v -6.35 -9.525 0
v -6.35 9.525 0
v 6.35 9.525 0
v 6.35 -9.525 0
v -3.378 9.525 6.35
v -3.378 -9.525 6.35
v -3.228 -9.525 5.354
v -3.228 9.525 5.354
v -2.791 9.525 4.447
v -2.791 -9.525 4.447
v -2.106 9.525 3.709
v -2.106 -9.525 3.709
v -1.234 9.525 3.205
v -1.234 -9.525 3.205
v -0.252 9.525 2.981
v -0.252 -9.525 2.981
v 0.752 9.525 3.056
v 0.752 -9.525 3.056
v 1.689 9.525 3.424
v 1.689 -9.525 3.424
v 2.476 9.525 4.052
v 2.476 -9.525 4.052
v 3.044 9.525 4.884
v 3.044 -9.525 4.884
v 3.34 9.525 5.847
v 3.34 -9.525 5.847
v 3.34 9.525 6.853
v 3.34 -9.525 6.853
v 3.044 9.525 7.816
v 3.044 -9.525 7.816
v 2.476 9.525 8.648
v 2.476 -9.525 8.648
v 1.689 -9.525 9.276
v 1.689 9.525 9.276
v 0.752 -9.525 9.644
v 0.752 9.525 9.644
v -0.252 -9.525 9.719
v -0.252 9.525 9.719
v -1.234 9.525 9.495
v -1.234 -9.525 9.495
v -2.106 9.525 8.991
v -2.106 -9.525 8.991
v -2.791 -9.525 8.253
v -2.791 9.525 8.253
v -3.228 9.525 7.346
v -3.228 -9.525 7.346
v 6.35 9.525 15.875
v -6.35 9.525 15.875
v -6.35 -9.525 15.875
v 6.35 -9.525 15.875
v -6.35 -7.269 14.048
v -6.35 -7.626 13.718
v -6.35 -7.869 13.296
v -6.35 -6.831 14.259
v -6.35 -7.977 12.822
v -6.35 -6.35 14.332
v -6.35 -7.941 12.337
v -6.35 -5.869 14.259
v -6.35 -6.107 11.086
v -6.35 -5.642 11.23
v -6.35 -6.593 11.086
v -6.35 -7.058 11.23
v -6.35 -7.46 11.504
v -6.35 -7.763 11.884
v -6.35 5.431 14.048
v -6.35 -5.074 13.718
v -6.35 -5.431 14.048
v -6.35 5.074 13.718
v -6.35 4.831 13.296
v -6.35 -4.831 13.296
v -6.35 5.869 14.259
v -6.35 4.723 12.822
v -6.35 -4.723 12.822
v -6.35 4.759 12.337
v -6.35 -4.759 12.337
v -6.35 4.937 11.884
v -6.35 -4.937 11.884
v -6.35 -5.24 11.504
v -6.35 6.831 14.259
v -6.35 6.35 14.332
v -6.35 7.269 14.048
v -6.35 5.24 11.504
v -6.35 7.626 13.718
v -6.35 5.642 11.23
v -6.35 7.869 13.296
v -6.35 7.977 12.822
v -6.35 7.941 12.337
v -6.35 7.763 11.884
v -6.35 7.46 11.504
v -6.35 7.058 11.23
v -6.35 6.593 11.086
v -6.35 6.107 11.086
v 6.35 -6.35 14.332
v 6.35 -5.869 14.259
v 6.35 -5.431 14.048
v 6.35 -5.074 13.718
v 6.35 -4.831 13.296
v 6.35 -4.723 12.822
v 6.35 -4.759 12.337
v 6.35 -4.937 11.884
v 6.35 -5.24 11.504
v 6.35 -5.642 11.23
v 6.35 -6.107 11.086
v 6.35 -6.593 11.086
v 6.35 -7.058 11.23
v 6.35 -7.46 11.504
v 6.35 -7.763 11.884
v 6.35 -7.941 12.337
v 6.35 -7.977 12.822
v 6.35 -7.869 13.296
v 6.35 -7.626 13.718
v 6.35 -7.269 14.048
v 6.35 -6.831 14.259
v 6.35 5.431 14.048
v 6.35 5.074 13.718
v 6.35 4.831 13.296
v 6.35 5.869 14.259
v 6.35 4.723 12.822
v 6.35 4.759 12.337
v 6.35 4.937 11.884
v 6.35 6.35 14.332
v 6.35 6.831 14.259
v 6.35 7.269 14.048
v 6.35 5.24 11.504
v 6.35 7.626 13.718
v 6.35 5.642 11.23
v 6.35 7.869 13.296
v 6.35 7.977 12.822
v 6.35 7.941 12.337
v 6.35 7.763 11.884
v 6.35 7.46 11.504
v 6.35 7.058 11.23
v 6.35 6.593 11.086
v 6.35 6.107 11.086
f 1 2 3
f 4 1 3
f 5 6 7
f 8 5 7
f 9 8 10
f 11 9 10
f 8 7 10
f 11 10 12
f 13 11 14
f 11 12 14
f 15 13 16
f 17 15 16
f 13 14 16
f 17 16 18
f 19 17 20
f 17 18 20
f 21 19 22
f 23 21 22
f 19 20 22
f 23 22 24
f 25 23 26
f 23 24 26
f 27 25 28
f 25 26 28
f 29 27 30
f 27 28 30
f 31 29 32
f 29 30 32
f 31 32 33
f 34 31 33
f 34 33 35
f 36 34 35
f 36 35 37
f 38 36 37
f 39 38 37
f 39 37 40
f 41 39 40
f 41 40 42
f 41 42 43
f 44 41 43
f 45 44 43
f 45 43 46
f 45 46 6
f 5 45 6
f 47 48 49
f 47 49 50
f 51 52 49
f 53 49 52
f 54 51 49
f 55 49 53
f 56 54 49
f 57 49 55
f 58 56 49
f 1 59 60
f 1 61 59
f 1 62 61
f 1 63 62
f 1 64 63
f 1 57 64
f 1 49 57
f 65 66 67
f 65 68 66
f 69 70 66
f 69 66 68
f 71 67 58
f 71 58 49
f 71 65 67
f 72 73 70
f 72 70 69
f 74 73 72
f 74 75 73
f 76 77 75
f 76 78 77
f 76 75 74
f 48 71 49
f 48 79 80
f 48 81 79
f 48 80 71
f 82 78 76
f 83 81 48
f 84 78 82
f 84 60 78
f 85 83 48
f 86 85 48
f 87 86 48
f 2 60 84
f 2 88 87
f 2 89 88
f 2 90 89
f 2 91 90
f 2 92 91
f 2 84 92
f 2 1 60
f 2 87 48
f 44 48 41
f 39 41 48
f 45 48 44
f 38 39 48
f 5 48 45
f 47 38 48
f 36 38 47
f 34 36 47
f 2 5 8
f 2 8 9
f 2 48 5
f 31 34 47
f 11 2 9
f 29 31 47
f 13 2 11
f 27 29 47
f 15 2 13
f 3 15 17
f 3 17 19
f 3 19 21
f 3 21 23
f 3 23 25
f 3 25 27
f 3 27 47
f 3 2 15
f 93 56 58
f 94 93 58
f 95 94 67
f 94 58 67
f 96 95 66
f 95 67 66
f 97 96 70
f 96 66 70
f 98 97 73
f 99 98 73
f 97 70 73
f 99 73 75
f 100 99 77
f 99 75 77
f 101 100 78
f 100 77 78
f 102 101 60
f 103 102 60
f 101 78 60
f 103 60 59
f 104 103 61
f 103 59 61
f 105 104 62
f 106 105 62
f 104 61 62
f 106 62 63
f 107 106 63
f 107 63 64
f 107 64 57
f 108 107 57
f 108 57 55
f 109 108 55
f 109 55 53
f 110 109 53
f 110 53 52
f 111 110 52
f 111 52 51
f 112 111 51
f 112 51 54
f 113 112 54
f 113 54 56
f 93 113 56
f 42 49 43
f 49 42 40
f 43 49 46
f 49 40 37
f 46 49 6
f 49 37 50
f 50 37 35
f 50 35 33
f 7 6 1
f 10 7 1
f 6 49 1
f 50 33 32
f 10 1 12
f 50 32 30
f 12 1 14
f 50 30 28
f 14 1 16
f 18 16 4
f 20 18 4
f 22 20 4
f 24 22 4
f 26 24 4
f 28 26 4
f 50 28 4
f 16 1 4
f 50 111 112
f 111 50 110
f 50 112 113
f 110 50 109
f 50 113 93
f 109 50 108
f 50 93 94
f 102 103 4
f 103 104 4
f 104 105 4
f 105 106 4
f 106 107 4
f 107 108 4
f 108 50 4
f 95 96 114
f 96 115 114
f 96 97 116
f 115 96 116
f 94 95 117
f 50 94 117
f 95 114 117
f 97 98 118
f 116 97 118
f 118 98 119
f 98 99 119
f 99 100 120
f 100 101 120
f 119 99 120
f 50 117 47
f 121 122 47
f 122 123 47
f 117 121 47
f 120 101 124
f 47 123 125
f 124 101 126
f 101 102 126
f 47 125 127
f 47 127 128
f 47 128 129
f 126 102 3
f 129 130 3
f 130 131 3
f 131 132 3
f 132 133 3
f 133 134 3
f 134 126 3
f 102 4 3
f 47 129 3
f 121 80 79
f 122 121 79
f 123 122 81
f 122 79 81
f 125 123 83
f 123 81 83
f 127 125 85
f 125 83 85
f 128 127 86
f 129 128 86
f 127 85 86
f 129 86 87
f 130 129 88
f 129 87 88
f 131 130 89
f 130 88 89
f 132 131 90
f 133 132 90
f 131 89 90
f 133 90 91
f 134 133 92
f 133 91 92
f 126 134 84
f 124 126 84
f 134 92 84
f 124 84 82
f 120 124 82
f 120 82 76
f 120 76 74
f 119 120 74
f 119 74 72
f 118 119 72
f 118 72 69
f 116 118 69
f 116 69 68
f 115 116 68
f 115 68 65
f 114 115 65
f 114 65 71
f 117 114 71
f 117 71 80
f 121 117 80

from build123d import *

# Parameters (mm, degrees)
SKETCH1_W               = 12.7
SKETCH1_H               = 19.05
BOSS_EXTRUDE1_DEPTH     = 15.875
F_1_4_CLEARANCE_HOLE1_D = 6.7564
F_4_CLEARANCE_HOLE1_D   = 3.2639


with BuildPart() as part:
    # Sketch1 → Boss-Extrude1 (new body)
    with BuildSketch(Plane.XY):
        Rectangle(SKETCH1_W, SKETCH1_H)
    extrude(amount=BOSS_EXTRUDE1_DEPTH)

    # 1/4 Clearance Hole1 (through all)
    with Locations(Plane(origin=(0, 9.525, 0), x_dir=(1, 0, 0), z_dir=(0, 1, 0))):
        with Locations((0, -6.35)):
            Hole(F_1_4_CLEARANCE_HOLE1_D / 2)

    # #4 Clearance Hole1 (through all)
    with Locations(Plane(origin=(6.35, 0, 0), x_dir=(0, 0, -1), z_dir=(1, 0, 0))):
        with Locations((-12.7, 6.35), (-12.7, -6.35)):
            Hole(F_4_CLEARANCE_HOLE1_D / 2)


solid = part.part
